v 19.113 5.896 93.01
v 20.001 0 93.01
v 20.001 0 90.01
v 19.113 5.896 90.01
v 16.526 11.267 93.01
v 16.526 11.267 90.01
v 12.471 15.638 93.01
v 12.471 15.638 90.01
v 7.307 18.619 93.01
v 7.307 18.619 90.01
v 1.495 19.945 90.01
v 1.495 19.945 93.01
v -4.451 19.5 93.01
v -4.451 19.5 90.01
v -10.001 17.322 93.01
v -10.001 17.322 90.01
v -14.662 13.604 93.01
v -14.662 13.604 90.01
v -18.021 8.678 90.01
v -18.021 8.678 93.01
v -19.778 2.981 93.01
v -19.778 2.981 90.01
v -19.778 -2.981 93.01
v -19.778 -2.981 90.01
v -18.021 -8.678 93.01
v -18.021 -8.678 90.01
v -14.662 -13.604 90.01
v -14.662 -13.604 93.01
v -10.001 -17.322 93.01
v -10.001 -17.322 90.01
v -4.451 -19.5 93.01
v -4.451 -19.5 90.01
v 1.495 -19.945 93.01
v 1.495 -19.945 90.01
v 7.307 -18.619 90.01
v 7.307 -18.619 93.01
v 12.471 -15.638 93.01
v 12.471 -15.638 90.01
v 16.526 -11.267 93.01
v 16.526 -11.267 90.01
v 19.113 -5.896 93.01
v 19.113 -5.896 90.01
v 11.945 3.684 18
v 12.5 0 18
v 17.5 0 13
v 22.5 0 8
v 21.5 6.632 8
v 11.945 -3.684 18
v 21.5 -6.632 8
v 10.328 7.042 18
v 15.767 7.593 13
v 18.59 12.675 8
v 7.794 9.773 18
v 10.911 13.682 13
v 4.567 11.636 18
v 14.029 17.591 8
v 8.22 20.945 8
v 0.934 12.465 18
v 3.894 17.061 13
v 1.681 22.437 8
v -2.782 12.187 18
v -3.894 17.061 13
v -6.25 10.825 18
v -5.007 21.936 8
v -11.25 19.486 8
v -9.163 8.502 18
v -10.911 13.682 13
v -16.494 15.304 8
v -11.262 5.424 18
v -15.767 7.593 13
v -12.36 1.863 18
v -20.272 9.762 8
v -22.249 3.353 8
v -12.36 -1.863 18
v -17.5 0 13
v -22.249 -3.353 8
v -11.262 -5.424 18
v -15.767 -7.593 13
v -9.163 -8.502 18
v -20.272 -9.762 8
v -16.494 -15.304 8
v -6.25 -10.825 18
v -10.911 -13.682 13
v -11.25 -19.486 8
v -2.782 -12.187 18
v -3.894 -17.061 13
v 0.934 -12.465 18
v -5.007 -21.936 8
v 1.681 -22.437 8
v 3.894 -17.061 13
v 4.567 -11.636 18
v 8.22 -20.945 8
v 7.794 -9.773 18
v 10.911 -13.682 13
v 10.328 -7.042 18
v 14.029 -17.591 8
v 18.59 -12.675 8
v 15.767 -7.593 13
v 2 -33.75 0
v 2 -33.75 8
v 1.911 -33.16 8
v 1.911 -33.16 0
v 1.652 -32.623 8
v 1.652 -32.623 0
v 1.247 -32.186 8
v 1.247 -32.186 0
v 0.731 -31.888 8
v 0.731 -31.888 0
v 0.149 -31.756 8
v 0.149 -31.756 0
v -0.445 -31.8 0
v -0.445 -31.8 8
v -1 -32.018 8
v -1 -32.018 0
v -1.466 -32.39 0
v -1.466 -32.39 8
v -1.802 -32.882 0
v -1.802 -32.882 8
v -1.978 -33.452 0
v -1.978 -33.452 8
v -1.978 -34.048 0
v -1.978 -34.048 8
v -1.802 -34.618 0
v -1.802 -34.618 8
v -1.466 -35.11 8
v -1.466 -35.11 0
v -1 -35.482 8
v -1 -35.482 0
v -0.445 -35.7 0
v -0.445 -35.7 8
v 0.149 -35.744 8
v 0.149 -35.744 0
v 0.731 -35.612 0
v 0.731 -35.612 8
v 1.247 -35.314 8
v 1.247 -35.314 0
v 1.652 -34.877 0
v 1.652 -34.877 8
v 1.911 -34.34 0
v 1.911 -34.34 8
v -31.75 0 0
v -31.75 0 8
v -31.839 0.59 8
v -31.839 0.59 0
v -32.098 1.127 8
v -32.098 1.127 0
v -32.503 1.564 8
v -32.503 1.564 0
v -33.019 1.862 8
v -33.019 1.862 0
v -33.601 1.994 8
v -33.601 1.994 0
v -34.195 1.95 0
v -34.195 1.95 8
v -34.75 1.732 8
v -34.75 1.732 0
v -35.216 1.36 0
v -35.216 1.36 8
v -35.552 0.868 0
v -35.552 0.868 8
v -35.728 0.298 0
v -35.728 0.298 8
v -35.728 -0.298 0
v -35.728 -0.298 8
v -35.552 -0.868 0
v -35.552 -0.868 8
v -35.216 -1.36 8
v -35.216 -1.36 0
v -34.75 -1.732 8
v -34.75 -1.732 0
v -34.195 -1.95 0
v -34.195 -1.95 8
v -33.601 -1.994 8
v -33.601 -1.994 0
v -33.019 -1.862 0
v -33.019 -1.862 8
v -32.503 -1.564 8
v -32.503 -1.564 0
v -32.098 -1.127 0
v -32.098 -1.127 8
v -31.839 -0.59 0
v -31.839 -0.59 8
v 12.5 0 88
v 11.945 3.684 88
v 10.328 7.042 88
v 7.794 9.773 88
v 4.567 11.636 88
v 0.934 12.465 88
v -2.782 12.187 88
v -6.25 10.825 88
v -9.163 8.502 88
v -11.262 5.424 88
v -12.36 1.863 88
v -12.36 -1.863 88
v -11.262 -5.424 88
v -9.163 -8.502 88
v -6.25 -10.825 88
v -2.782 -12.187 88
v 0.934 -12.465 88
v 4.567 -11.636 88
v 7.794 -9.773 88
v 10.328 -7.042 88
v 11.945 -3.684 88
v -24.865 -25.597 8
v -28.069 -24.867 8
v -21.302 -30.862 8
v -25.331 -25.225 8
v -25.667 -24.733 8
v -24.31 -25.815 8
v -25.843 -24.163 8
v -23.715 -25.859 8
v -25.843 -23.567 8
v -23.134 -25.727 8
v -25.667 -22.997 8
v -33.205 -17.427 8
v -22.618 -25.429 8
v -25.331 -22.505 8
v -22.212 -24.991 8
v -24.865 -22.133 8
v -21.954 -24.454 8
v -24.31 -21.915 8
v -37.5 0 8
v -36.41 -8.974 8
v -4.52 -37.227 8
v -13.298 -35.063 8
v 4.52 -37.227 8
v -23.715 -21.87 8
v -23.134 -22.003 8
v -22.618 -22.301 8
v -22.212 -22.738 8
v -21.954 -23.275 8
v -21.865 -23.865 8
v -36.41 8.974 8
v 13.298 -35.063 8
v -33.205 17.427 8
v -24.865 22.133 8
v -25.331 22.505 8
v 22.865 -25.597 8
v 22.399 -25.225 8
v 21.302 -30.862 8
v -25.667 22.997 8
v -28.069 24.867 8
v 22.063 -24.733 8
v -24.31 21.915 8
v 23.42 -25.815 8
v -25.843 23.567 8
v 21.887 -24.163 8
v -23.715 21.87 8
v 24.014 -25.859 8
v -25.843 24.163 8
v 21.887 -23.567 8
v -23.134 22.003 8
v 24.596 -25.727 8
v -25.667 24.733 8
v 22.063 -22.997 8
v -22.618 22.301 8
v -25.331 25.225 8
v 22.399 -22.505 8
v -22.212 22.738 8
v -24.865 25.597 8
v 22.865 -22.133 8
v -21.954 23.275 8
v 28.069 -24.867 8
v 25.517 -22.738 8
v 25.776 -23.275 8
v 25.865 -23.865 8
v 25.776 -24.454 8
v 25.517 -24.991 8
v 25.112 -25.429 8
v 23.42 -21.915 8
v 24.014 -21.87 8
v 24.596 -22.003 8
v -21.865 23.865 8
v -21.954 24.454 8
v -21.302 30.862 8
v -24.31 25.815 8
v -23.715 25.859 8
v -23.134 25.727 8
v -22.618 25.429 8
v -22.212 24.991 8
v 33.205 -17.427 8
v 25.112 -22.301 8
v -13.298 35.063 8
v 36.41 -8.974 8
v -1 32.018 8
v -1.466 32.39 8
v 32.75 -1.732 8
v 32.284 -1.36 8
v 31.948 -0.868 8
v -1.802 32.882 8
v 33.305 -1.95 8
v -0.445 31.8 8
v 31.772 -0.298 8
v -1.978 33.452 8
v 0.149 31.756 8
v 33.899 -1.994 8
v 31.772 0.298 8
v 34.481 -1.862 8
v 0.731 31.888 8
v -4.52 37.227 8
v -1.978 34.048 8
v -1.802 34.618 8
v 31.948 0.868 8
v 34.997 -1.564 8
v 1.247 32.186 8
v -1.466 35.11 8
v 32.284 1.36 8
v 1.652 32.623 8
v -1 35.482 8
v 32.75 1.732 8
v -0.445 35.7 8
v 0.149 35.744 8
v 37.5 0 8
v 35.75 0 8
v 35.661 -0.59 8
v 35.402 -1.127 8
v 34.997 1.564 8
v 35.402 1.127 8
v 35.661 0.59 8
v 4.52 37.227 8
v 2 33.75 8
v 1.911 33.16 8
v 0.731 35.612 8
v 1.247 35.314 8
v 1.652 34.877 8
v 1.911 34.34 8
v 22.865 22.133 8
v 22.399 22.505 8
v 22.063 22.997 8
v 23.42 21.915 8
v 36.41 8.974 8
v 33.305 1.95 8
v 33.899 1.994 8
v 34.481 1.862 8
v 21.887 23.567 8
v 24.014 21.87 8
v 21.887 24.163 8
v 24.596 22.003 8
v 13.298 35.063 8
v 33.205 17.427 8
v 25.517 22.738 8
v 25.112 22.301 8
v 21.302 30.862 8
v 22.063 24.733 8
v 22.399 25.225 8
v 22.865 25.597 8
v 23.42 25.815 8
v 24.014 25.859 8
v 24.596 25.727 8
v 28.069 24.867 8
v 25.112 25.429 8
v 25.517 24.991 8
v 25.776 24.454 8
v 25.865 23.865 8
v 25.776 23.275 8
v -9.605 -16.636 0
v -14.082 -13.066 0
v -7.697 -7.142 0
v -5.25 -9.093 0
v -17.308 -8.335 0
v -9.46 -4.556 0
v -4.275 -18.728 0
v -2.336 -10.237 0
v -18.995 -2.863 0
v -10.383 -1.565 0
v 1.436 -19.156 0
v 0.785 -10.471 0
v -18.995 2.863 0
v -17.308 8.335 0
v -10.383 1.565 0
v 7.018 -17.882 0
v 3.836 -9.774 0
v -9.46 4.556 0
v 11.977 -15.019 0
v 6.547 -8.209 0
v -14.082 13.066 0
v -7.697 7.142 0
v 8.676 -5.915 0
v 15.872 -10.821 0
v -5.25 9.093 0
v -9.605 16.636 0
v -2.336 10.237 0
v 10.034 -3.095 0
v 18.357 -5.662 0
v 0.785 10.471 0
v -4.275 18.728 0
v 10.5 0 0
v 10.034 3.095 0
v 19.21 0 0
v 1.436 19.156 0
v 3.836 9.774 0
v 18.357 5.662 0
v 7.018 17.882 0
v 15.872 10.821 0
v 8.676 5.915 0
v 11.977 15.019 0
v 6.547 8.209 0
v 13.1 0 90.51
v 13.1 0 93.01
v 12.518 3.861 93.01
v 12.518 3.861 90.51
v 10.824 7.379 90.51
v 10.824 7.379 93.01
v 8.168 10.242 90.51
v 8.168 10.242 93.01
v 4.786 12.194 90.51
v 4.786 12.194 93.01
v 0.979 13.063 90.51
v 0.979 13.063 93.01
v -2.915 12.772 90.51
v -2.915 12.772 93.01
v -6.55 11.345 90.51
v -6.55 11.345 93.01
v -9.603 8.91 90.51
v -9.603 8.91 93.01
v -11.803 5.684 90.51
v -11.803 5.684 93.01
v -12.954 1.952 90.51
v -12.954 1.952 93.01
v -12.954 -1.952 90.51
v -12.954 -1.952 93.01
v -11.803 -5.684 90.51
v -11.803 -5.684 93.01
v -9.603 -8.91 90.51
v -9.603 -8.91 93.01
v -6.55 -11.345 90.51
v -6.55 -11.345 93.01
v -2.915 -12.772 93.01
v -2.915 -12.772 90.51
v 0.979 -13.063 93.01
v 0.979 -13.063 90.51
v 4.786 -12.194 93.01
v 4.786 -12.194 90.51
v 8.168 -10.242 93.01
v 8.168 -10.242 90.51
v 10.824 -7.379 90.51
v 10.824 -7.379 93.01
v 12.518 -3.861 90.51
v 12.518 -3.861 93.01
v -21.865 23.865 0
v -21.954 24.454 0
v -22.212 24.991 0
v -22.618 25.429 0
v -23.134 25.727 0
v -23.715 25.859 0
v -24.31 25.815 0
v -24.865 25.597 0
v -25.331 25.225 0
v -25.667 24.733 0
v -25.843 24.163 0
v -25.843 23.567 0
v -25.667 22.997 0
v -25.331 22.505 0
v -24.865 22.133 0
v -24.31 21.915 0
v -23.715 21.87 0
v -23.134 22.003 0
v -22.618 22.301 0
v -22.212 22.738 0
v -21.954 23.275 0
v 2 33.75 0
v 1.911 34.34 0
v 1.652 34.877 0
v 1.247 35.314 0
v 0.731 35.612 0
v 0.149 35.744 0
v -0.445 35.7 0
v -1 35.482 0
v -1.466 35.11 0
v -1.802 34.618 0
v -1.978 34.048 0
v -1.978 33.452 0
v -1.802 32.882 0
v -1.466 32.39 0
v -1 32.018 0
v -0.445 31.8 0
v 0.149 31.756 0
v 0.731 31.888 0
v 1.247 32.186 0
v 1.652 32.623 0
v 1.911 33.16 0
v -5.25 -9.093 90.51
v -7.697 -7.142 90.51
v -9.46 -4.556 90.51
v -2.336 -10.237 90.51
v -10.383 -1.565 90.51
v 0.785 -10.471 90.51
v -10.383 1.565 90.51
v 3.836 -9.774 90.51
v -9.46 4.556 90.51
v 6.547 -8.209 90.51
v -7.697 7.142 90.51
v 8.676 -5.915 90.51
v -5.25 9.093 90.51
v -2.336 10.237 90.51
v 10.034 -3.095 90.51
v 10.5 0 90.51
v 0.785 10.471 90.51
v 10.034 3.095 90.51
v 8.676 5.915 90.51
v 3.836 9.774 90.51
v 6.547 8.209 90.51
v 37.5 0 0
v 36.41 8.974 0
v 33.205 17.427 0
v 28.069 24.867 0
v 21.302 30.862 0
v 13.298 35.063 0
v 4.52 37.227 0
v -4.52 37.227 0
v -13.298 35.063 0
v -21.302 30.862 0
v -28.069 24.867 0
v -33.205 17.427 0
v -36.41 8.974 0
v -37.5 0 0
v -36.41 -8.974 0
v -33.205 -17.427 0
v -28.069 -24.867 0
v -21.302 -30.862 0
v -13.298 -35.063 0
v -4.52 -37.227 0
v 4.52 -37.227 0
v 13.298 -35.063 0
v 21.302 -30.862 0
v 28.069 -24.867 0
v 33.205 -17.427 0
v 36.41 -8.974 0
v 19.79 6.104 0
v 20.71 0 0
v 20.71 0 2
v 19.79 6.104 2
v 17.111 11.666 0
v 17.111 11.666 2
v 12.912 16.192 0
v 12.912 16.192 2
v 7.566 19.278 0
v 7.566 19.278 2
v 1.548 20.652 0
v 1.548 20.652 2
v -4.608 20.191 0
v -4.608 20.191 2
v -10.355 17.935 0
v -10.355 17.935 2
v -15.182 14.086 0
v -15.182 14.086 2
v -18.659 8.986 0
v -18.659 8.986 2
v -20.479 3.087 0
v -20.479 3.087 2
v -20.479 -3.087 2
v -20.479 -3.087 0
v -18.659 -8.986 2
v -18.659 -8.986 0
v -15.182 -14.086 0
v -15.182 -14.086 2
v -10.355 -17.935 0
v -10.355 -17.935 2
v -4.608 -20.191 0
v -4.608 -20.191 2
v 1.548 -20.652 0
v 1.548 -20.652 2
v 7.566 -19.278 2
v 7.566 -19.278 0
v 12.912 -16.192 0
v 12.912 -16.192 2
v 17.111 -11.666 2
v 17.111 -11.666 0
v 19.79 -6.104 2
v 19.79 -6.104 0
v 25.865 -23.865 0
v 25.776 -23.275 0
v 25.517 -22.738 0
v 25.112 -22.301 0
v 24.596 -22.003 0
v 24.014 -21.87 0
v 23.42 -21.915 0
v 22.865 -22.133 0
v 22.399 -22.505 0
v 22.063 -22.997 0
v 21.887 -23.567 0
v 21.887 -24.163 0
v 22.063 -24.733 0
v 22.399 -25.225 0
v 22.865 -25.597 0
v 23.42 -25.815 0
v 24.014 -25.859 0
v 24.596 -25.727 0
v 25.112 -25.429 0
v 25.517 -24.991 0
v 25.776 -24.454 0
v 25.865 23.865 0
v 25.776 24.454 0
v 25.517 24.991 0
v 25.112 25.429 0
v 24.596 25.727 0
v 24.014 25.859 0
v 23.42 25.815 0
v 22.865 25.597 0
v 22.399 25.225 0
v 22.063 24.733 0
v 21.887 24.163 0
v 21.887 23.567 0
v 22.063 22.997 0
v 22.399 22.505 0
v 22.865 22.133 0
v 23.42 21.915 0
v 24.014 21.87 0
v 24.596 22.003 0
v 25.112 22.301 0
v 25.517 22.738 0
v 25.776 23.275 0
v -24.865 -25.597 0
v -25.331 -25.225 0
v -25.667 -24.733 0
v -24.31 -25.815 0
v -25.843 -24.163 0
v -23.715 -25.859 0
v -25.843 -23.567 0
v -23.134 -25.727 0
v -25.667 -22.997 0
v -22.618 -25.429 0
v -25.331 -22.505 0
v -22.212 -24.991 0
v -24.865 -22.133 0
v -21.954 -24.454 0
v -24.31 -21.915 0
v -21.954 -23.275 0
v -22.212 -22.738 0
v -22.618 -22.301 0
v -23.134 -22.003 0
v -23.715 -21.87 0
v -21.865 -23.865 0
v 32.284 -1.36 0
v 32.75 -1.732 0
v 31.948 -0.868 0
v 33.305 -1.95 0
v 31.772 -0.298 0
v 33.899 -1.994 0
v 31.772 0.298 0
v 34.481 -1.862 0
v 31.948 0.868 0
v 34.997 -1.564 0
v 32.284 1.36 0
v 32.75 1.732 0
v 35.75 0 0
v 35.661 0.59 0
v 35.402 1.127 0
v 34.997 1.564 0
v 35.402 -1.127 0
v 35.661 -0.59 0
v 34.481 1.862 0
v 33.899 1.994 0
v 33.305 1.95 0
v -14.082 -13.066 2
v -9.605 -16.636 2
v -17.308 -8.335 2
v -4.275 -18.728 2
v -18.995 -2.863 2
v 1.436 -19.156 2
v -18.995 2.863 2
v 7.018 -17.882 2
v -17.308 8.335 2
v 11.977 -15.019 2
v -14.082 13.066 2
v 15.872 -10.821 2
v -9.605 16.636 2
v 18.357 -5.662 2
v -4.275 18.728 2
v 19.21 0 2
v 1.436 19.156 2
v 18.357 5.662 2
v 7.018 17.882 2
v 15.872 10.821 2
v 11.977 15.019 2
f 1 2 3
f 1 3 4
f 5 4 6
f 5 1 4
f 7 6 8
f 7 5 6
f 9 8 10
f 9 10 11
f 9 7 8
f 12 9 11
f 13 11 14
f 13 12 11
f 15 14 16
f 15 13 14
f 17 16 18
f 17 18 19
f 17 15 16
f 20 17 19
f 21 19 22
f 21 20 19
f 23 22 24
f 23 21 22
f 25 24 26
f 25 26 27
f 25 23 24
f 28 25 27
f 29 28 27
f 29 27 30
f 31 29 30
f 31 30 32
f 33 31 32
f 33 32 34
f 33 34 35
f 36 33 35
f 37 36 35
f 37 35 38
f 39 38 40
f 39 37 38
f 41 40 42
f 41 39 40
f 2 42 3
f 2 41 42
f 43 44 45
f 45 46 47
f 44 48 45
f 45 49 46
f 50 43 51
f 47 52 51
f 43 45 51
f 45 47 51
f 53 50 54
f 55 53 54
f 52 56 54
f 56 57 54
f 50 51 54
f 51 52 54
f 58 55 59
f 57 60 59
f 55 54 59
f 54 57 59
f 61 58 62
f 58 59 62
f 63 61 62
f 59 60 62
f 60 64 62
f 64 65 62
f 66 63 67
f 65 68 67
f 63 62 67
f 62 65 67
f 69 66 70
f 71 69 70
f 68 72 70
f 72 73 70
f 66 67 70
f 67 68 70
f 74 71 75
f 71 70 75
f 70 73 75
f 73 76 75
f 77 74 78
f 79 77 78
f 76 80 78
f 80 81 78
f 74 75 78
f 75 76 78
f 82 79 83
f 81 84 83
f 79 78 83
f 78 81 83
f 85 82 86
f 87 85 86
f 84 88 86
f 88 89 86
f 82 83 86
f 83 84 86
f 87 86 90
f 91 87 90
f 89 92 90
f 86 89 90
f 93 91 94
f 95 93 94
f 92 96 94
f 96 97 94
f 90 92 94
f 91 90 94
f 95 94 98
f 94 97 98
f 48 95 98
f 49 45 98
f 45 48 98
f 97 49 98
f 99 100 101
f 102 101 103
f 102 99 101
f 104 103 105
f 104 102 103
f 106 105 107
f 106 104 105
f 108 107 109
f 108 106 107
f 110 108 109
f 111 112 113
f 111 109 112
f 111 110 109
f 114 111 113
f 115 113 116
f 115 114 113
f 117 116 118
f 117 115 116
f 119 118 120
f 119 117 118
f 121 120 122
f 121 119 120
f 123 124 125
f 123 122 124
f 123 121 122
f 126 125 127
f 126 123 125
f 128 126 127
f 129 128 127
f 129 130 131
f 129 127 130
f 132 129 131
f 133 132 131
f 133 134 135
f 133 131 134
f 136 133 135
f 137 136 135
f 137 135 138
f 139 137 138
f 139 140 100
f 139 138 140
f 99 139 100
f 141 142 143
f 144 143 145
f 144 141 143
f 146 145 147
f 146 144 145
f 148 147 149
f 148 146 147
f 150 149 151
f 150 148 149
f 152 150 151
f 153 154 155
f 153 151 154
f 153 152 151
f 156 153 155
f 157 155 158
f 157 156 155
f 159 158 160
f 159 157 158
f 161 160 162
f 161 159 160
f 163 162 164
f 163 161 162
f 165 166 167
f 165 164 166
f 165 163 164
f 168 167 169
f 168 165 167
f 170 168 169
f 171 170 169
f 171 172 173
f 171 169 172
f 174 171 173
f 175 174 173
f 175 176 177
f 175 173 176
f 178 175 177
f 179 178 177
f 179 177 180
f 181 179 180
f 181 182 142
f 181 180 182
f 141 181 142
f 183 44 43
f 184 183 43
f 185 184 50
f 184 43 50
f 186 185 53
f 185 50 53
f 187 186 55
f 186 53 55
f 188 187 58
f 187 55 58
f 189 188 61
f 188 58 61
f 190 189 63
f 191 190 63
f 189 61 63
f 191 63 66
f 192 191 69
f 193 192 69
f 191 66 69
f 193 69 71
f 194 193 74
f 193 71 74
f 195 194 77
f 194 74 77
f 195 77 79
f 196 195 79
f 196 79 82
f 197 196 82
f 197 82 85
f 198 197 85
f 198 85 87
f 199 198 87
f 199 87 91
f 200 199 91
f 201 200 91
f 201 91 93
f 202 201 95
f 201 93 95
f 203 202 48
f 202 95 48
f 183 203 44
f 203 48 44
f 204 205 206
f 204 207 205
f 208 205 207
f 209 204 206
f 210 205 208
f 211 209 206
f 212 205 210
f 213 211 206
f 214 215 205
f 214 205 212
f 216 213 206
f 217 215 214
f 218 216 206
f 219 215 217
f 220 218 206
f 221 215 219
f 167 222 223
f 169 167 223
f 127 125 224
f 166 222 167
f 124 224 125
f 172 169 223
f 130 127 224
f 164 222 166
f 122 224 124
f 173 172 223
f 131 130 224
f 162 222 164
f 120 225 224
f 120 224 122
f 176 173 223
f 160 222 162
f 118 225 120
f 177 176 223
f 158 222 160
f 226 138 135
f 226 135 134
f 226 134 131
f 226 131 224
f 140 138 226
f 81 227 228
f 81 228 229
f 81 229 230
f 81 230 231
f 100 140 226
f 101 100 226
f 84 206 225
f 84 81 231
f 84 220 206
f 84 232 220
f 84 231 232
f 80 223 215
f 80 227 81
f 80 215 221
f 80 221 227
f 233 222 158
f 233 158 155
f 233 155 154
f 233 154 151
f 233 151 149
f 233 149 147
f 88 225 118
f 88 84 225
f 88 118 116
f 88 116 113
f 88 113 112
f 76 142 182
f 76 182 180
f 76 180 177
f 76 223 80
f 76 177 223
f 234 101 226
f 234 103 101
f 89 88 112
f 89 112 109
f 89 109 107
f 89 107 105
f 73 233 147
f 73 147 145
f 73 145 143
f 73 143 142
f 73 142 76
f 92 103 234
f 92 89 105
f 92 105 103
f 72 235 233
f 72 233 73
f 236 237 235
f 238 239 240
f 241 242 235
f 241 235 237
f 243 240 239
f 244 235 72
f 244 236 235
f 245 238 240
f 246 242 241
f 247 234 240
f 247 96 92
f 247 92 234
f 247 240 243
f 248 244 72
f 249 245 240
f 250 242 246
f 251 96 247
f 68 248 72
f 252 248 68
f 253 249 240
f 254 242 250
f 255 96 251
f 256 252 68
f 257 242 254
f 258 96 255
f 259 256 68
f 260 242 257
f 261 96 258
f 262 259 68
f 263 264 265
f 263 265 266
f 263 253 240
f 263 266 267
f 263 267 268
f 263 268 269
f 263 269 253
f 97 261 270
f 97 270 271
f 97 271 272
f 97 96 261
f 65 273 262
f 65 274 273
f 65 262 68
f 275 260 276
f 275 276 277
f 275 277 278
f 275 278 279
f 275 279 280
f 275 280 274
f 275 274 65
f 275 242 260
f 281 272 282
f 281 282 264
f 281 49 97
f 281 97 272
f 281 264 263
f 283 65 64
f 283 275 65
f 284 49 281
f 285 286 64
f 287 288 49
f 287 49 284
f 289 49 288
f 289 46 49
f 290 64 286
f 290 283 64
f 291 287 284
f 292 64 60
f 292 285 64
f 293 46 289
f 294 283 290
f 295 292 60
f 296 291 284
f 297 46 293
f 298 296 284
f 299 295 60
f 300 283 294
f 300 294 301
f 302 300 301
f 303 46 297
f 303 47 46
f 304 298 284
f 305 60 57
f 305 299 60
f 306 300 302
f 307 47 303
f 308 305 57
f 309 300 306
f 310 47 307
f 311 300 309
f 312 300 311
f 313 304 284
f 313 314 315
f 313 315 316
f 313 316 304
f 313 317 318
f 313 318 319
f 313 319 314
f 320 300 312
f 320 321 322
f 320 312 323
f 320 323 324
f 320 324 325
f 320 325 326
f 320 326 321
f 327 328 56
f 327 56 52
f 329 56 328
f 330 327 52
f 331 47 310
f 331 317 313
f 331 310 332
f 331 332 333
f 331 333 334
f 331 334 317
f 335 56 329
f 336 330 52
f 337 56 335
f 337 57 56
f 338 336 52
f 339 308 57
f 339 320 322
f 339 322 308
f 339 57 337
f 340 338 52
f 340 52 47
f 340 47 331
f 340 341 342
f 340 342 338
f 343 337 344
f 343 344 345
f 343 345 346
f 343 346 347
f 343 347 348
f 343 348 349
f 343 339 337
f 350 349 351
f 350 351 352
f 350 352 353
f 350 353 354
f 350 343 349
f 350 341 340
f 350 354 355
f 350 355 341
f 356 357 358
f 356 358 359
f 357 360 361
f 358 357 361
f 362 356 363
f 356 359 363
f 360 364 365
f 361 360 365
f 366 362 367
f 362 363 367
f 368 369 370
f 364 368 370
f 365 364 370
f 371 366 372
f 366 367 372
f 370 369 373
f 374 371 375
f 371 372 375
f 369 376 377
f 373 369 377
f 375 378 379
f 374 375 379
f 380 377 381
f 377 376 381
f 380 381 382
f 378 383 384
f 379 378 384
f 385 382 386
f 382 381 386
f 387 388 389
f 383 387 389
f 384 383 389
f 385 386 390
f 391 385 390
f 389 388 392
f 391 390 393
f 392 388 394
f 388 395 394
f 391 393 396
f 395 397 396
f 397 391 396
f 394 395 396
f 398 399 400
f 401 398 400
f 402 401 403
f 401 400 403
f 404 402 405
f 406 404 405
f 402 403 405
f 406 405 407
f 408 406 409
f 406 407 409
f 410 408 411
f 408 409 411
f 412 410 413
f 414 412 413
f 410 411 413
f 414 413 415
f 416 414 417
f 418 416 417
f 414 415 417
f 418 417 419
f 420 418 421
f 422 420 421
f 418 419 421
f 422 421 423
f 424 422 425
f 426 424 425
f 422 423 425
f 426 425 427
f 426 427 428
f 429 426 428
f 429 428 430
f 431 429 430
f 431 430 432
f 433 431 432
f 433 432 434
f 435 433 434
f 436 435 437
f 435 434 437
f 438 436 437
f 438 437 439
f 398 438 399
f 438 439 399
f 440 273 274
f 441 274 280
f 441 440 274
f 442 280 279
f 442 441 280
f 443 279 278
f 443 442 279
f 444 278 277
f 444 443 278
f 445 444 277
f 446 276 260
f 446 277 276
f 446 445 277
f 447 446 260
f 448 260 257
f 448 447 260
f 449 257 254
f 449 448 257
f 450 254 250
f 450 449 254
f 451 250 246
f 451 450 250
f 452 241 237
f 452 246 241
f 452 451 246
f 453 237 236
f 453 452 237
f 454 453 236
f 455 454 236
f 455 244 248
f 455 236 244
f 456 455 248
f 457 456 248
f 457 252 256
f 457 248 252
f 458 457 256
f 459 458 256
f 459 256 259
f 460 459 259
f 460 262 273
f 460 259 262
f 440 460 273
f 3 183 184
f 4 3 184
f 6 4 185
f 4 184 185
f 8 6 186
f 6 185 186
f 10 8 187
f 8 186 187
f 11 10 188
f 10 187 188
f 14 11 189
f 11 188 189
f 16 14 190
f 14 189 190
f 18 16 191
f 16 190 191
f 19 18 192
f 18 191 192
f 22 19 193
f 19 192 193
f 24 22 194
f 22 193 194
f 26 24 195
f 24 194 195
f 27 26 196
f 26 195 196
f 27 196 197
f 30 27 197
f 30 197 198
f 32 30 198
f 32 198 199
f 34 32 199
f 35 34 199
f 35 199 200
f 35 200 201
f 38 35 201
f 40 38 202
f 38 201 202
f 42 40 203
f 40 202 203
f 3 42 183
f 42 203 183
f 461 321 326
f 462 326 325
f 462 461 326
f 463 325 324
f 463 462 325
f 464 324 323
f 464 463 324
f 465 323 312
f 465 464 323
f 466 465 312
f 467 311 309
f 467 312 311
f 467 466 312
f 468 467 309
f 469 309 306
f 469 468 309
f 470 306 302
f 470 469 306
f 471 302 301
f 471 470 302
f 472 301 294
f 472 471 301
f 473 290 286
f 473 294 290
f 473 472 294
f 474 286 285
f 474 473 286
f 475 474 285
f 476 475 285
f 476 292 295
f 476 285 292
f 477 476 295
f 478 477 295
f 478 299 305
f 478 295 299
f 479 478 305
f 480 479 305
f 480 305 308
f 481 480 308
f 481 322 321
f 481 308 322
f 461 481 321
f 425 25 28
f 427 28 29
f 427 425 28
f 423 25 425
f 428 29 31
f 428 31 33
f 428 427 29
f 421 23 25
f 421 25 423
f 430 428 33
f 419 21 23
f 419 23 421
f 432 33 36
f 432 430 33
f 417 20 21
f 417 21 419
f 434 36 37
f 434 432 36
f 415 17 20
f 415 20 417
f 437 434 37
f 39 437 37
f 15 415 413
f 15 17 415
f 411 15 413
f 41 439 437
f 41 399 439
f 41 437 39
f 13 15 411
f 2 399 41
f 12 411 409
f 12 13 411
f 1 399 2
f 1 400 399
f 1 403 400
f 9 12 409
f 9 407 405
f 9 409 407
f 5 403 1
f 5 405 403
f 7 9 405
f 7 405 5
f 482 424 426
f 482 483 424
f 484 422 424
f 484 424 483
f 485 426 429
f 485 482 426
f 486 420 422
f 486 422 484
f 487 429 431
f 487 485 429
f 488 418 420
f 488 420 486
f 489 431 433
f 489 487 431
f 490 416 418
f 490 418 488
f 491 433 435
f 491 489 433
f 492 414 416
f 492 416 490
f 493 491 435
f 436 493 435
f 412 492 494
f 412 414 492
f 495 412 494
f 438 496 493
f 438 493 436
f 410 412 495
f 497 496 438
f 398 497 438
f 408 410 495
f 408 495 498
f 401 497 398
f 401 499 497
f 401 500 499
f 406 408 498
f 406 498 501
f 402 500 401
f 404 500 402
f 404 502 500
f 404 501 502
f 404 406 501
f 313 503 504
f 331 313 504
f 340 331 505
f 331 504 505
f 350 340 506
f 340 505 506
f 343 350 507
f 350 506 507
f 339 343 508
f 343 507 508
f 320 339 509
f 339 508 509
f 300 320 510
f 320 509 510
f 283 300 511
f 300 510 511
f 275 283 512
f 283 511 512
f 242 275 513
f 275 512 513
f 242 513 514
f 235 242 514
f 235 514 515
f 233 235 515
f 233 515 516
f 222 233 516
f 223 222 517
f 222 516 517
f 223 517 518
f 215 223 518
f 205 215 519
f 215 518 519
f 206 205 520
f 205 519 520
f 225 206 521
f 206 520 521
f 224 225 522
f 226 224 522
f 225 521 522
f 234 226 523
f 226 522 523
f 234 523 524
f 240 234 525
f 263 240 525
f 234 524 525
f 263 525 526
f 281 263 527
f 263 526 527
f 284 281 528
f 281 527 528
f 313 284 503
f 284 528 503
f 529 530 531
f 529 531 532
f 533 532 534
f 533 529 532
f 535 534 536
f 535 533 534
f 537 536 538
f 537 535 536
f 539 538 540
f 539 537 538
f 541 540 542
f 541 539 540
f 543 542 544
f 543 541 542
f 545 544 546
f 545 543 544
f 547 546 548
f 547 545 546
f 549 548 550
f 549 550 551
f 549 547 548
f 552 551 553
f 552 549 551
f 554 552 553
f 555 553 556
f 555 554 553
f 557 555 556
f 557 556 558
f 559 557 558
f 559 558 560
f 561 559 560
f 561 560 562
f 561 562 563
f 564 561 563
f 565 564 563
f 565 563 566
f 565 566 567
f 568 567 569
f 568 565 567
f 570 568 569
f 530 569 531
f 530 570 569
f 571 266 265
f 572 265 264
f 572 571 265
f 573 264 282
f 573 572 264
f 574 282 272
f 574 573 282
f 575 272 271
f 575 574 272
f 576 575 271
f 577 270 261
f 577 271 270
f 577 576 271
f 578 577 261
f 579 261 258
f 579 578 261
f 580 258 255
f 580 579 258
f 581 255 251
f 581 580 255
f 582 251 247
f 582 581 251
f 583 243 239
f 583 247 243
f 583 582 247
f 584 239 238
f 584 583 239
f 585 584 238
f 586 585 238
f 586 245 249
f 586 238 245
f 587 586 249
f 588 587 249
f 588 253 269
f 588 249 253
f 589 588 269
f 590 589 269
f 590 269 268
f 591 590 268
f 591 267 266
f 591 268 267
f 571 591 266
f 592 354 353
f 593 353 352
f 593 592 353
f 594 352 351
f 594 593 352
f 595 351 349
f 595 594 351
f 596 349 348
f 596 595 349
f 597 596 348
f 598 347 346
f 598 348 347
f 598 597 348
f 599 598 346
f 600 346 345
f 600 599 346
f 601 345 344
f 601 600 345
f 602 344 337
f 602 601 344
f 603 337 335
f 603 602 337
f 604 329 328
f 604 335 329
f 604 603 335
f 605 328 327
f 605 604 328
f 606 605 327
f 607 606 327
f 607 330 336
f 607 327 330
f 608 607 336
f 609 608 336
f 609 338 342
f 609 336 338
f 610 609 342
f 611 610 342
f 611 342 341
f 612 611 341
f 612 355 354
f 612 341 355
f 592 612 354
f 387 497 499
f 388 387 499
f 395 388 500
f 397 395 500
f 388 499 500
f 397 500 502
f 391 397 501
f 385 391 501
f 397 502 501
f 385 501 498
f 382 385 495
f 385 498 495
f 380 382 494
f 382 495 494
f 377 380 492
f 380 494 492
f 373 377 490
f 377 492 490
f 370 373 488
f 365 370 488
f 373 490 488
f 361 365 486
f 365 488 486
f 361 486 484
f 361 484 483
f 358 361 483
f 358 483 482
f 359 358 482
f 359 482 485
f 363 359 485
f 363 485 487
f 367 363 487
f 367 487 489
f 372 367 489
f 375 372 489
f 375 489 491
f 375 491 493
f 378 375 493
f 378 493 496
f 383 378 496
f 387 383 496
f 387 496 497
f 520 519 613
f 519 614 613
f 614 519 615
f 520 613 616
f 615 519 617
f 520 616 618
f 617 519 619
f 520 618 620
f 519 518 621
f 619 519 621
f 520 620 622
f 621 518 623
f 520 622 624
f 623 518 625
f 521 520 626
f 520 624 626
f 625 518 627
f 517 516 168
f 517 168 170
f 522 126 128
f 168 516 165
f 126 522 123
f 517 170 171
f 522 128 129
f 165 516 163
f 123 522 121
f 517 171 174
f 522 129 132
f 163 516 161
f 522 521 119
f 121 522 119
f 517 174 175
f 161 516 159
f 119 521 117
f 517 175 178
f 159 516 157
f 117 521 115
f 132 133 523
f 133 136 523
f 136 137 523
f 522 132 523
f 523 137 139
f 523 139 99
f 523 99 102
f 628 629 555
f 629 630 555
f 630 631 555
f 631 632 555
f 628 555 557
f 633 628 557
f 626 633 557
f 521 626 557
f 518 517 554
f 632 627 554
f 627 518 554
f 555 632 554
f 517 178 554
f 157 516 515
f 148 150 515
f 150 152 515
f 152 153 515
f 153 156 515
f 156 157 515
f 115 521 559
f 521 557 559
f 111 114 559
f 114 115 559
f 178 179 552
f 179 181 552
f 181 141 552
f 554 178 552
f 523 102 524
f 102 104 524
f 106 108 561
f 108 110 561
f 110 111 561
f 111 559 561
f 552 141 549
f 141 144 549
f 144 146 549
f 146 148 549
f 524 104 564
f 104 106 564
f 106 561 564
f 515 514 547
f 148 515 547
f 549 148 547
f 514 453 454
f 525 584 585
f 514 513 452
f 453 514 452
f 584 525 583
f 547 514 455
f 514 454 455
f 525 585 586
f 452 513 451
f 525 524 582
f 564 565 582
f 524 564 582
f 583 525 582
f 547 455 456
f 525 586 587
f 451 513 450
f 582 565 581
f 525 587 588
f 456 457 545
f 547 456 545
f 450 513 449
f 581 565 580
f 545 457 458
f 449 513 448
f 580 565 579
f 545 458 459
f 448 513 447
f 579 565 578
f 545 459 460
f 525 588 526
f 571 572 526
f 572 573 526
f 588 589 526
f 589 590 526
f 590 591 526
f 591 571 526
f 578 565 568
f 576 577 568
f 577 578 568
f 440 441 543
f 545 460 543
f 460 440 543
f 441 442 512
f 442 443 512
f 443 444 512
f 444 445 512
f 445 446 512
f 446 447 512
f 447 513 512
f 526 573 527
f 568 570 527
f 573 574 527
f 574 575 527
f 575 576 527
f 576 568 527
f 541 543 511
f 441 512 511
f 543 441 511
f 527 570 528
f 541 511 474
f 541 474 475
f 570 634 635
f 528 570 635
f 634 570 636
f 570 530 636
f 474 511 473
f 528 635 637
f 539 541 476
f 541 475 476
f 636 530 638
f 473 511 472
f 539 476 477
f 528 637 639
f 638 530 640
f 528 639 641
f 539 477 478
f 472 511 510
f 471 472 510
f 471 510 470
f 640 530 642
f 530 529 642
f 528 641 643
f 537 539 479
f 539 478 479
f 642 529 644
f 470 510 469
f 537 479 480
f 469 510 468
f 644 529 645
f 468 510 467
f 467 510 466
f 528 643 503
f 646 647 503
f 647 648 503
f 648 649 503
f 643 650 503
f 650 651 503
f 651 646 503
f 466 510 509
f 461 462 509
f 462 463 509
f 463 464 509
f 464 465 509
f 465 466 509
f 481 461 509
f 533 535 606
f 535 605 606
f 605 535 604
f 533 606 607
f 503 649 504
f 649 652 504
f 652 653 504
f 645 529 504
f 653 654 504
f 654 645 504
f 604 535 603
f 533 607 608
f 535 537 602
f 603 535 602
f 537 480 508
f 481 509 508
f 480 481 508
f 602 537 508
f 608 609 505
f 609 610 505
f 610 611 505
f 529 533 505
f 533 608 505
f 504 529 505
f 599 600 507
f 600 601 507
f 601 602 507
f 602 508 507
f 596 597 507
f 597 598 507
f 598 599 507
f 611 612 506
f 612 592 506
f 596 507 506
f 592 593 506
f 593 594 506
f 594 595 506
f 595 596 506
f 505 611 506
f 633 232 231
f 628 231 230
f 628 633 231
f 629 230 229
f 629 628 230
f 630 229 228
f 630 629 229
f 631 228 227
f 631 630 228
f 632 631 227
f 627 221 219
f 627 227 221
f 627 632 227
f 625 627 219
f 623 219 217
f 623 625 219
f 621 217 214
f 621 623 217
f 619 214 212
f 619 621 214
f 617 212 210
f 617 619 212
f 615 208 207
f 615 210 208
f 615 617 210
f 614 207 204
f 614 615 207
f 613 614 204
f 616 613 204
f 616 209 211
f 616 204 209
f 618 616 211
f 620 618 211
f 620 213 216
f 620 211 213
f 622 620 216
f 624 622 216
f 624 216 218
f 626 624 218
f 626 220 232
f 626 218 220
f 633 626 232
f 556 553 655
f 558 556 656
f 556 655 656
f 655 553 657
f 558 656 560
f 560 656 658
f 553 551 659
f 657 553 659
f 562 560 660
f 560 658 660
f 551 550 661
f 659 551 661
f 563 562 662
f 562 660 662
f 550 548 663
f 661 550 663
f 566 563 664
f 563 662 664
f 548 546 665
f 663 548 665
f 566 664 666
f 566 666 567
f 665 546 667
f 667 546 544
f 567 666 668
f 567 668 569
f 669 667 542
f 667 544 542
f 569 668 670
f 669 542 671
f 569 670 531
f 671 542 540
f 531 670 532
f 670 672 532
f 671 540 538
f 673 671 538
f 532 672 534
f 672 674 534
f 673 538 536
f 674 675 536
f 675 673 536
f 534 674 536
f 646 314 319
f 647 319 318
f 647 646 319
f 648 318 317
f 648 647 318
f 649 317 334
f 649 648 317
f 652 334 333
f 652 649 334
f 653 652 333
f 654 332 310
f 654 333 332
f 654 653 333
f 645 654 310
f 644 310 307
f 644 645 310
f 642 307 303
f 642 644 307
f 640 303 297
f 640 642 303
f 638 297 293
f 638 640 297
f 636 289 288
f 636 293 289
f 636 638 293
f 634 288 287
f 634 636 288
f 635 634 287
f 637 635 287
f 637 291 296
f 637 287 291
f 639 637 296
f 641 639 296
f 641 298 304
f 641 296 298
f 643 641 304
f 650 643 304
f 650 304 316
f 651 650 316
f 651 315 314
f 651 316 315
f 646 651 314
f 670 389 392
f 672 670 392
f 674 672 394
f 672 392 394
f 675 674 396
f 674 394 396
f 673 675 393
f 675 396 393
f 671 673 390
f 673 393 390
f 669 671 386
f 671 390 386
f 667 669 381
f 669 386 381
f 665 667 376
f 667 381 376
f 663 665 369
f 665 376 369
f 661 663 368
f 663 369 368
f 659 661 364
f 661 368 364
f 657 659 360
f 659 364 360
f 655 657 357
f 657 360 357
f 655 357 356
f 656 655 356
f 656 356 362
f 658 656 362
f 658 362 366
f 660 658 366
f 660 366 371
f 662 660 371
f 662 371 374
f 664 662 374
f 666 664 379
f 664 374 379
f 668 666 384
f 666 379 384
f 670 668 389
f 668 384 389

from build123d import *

# Parameters (mm, degrees)
SKETCH2_R           = 37.5
SKETCH2_R_2         = 5.35
BOSS_EXTRUDE2_DEPTH = 8
SKETCH14_R          = 2
CUT_EXTRUDE6_DEPTH  = 54.633012222
SKETCH3_R           = 20.71
SKETCH3_R_2         = 19.21
CUT_EXTRUDE2_DEPTH  = 2
SKETCH7_R           = 12.5
SKETCH7_R_2         = 10.5
BOSS_EXTRUDE4_DEPTH = 80
SKETCH10_R          = 12.5
BOSS_EXTRUDE5_DEPTH = 2.01
BOSS_EXTRUDE5_DRAFT = -75
SKETCH11_R          = 10.5
CUT_EXTRUDE3_DEPTH  = 105.4715277
BOSS_EXTRUDE6_START = 3
SKETCH12_R          = 20.001422123
SKETCH12_R_2        = 10.5
BOSS_EXTRUDE6_DEPTH = 3
SKETCH13_R          = 13.1
CUT_EXTRUDE4_DEPTH  = 2.5
CHAMFER1_SIZE       = 10


with BuildPart() as part:
    # Sketch2 → Boss-Extrude2 (new body)
    with BuildSketch(Plane.XY):
        Circle(SKETCH2_R)
        Circle(SKETCH2_R_2, mode=Mode.SUBTRACT)
    extrude(amount=BOSS_EXTRUDE2_DEPTH)

    # Sketch14 → Cut-Extrude6 (cut, through all)
    with BuildSketch(Plane.XY):
        with Locations((0, 33.75)):
            Circle(SKETCH14_R)
        with Locations((-23.864853865, 23.864853865)):
            Circle(SKETCH14_R)
        with Locations((-33.75, 0)):
            Circle(SKETCH14_R)
        with Locations((-23.864853865, -23.864853865)):
            Circle(SKETCH14_R)
        with Locations((0, -33.75)):
            Circle(SKETCH14_R)
        with Locations((23.864853865, -23.864853865)):
            Circle(SKETCH14_R)
        with Locations((33.75, 0)):
            Circle(SKETCH14_R)
        with Locations((23.864853865, 23.864853865)):
            Circle(SKETCH14_R)
    extrude(amount=CUT_EXTRUDE6_DEPTH, mode=Mode.SUBTRACT)

    # Sketch3 → Cut-Extrude2 (cut)
    with BuildSketch(Plane.XY):
        Circle(SKETCH3_R)
        Circle(SKETCH3_R_2, mode=Mode.SUBTRACT)
    extrude(amount=CUT_EXTRUDE2_DEPTH, mode=Mode.SUBTRACT)

    # Sketch7 → Boss-Extrude4 (add)
    with BuildSketch(Plane.XY.offset(8)):
        Circle(SKETCH7_R)
        Circle(SKETCH7_R_2, mode=Mode.SUBTRACT)
    extrude(amount=BOSS_EXTRUDE4_DEPTH)


with BuildPart() as boss_extrude5_tool:
    # Sketch10 → Boss-Extrude5 (with draft: the straight prism first)
    with BuildSketch(Plane.XY.offset(88)):
        Circle(SKETCH10_R)
    extrude(amount=BOSS_EXTRUDE5_DEPTH)
    # Boss-Extrude5: the draft: its side faces are tilted about the plane it starts from
    boss_extrude5_sides = [boss_extrude5_tool.faces().sort_by_distance(p)[0] for p in [
        (-12.5, 0, 89.005),
    ]]
    draft(boss_extrude5_sides, Plane.XY.offset(88), BOSS_EXTRUDE5_DRAFT)


with BuildPart() as part_1:
    add(part.part)

    # Boss-Extrude5: add boss_extrude5_tool
    add(boss_extrude5_tool.part)

    # Sketch11 → Cut-Extrude3 (cut, through all)
    with BuildSketch(Plane.XY.offset(90.01)):
        Circle(SKETCH11_R)
    extrude(amount=-CUT_EXTRUDE3_DEPTH, mode=Mode.SUBTRACT)

    # Sketch12 → Boss-Extrude6 (add)
    with BuildSketch(Plane.XY.offset(90.01).offset(BOSS_EXTRUDE6_START)):
        Circle(SKETCH12_R)
        Circle(SKETCH12_R_2, mode=Mode.SUBTRACT)
    extrude(amount=-BOSS_EXTRUDE6_DEPTH)

    # Sketch13 → Cut-Extrude4 (cut)
    with BuildSketch(Plane.XY.offset(93.01)):
        Circle(SKETCH13_R)
    extrude(amount=-CUT_EXTRUDE4_DEPTH, mode=Mode.SUBTRACT)

    # Chamfer1
    chamfer1_edges = [part_1.edges().sort_by_distance(p)[0] for p in [
        (-12.5, 0, 8),
    ]]
    chamfer(chamfer1_edges, length=CHAMFER1_SIZE)


solid = part_1.part
